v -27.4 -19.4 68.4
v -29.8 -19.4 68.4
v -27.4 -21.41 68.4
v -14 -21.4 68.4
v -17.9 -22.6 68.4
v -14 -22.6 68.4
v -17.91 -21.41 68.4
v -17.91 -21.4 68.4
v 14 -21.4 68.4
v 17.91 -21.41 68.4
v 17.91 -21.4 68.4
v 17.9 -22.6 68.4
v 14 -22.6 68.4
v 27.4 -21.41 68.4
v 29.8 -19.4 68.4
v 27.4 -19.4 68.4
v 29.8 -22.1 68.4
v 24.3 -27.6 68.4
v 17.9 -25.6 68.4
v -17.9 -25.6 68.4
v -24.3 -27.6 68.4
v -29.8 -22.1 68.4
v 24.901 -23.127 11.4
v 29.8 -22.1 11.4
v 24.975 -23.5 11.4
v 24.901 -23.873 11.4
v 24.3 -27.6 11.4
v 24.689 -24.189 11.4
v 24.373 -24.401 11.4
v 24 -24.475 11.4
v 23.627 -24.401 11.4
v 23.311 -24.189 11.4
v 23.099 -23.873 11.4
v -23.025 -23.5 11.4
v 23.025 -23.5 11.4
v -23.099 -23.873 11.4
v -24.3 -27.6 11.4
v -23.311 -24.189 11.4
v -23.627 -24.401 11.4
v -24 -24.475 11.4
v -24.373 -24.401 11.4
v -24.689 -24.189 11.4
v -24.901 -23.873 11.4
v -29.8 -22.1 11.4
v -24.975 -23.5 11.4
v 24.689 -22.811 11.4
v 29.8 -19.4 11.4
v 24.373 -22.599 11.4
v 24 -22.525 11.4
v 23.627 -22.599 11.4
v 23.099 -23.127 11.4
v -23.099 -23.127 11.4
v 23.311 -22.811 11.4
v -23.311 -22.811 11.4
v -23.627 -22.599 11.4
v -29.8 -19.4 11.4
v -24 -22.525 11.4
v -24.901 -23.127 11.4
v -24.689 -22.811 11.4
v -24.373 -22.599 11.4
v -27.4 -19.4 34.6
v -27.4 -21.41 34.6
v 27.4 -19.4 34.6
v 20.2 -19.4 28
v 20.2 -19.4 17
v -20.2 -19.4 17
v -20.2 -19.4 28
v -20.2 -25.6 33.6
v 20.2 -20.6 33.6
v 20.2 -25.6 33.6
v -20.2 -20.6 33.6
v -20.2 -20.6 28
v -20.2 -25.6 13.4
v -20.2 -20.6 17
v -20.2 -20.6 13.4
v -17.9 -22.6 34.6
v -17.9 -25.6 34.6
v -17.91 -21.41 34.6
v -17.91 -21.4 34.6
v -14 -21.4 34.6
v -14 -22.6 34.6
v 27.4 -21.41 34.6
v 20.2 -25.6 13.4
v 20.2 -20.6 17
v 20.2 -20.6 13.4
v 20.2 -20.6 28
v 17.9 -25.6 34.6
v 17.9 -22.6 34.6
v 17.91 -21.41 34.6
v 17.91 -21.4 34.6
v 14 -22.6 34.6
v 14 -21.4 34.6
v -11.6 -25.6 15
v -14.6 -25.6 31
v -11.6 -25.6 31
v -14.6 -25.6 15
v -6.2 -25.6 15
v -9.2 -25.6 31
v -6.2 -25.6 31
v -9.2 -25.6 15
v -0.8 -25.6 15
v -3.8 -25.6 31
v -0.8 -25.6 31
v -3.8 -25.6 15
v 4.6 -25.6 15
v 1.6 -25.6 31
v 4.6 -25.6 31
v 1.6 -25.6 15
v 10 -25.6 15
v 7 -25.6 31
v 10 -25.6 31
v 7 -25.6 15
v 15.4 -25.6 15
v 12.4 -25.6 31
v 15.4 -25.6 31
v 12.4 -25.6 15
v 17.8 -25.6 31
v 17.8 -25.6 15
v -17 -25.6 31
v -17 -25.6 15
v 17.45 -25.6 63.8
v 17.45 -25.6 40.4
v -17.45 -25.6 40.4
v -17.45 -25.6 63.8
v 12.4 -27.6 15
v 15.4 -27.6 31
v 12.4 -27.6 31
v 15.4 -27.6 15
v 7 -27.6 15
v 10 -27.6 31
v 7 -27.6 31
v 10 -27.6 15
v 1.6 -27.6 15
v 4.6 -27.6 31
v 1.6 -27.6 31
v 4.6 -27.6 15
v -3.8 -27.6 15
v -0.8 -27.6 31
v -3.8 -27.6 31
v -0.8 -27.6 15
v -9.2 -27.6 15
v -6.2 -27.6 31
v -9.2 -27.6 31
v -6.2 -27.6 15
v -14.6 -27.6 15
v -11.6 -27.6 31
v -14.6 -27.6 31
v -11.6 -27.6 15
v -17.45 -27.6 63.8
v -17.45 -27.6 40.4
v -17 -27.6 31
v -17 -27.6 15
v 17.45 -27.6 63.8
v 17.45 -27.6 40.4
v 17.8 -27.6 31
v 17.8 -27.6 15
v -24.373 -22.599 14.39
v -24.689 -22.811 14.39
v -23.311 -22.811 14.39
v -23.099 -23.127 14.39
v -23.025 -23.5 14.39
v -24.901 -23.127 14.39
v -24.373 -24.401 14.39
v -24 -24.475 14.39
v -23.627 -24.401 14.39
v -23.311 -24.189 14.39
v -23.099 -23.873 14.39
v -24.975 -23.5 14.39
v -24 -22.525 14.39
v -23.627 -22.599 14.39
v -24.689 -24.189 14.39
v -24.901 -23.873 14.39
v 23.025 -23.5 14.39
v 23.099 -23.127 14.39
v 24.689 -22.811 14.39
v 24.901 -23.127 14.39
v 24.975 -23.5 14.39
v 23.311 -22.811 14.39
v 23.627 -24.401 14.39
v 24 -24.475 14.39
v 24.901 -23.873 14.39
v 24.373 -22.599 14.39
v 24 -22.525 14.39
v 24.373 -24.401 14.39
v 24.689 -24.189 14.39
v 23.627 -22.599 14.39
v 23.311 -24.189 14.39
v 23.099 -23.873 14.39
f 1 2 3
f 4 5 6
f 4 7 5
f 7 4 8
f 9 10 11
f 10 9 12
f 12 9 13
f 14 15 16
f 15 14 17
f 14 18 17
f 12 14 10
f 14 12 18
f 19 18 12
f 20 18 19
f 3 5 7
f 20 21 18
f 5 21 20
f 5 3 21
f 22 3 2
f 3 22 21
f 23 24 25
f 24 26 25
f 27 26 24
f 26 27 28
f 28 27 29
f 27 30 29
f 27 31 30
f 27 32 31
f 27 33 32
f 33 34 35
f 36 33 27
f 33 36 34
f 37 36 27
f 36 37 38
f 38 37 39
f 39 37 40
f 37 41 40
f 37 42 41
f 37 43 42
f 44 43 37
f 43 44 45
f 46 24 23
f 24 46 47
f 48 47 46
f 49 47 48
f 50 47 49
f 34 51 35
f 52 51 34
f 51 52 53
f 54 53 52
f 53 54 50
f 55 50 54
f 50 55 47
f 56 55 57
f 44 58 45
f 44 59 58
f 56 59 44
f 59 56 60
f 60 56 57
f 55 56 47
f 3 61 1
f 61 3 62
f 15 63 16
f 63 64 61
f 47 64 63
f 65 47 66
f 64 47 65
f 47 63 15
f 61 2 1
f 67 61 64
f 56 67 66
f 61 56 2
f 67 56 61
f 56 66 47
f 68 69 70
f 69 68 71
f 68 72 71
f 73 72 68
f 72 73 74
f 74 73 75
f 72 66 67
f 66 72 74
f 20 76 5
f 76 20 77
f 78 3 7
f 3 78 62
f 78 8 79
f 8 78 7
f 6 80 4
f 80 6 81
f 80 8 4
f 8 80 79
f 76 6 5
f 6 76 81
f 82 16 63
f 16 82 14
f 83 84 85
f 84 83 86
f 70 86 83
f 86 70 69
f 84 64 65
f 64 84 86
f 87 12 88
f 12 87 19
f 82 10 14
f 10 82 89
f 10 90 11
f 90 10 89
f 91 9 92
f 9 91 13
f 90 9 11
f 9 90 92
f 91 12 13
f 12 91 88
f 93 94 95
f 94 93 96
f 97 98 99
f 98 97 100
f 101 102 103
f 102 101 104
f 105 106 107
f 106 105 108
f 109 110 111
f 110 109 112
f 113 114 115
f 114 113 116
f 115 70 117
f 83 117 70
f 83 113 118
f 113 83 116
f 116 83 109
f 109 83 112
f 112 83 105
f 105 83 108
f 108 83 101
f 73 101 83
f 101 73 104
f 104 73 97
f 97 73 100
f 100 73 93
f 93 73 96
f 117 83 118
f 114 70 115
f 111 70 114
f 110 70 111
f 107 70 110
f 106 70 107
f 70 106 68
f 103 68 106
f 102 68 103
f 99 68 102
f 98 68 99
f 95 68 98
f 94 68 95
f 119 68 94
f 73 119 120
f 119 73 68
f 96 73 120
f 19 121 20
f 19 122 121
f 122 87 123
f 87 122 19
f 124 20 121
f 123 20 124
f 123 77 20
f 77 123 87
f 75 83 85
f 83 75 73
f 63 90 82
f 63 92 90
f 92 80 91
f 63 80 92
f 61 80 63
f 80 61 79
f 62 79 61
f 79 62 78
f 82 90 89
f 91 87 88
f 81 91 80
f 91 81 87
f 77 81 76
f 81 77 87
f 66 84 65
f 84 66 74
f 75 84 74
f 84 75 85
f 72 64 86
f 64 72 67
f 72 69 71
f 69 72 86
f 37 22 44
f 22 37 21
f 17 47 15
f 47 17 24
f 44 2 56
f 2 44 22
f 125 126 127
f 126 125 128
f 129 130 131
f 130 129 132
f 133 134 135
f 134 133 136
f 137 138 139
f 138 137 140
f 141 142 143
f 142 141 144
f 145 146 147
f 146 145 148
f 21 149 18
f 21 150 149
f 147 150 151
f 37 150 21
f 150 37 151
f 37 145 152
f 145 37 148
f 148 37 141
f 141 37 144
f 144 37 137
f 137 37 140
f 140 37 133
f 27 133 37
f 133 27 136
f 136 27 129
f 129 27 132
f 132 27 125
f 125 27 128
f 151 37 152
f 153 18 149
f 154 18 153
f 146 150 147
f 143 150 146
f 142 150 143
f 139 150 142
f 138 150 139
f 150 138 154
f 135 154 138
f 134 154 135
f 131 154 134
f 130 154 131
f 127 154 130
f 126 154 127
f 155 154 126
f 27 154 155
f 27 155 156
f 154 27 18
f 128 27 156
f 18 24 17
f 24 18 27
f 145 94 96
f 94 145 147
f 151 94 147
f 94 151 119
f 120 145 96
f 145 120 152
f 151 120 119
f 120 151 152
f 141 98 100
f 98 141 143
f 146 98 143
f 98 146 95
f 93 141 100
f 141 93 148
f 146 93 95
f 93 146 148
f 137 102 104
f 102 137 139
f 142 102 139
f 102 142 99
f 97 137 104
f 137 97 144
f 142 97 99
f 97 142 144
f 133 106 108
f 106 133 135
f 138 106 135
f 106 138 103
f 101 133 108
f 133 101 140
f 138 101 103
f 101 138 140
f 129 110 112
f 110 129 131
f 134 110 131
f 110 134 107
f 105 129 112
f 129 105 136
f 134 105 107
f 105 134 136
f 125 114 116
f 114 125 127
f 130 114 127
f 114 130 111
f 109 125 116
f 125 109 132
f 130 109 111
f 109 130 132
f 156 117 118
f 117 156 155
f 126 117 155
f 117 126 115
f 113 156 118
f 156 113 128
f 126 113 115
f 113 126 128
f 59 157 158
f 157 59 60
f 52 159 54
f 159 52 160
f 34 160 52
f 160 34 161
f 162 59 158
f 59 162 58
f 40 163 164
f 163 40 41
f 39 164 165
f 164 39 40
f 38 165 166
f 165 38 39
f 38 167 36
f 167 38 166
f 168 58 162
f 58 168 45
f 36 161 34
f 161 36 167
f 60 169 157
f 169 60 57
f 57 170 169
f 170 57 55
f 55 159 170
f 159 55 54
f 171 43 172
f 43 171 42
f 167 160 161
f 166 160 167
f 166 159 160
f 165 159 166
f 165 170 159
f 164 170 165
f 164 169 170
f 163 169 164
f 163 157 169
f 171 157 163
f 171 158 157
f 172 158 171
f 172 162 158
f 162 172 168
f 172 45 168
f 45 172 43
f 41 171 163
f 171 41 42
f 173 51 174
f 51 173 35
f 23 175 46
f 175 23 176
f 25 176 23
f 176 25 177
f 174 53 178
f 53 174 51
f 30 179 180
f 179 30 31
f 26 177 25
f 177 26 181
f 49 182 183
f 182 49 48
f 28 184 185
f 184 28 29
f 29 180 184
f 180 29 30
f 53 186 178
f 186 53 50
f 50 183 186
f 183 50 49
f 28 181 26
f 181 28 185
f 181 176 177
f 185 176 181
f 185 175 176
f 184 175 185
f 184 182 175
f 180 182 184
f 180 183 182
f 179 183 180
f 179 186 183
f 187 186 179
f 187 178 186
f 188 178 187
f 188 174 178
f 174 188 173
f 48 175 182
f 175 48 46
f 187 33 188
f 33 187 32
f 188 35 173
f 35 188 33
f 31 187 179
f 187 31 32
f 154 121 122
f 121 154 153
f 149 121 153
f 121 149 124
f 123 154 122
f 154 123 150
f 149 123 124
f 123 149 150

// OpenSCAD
// file: ../config.scad
// Sparky - shared parameters and the module interface spec.
// All dimensions in mm. Origin: centre line of the body, on the table.
// +X = right, +Y = back, -Y = front (screen side), +Z = up.
//
// Values marked (measure) are estimates; measure your parts and edit here.

$fn = 48;

// ---------- Interface (keep fixed so modules stay swappable) ----------
outer_w   = 64.4;    // shell, collar and base footprint
outer_y0  = -30;     // front face of the shell
outer_y1  = 26.6;    // back face of the shell
outer_d   = outer_y1 - outer_y0;          // 56.6
outer_cy  = (outer_y0 + outer_y1) / 2;    // footprint centre (Y)
corner_r  = 8;       // outer corner radius of shell, collar and base
wall      = 2;       // shell wall
in_r      = corner_r - wall;              // 6, inside radius of the shell
clear     = 0.3;     // fit clearance between printed parts

feet_h    = 2;       // base feet
base_top  = 7;       // top of the base = underside of the rack
collar_h  = 4;
shell_z0  = base_top + collar_h;          // 11, bottom of the shell
shell_z1  = 76;      // top of the shell

// Magnets: 6 x 3 mm neodymium discs, all N faces pointing up.
mag_d     = 6.2;     // pocket diameter (magnet 6.0)
mag_h     = 3.2;     // pocket depth (magnet 3.0)
boss_d    = 9;

mag_base_rack  = [[-24,-15],[24,-15],[-24,16],[24,16]];   // base top <-> rack floor
mag_rack_shell = [[-23,-15],[23,-15],[-23,17],[23,17]];   // rack towers <-> shell ceiling
pin_hole  = 1.95;    // locating pins: short pieces of 1.75 mm filament
pin_depth = 3;
collar_pins = [[-15, 24.25], [15, 24.25]];   // base <-> collar
face_pins   = [[-24, -23.5], [24, -23.5]];   // rack floor <-> face frame

// ---------- Rack (the body every part slides into) ----------
rack_xo   = 29.8;    // outside of the side walls
rack_t    = 2.4;     // side wall thickness
rack_xi   = rack_xo - rack_t;            // 27.4
rack_yf   = -27.6;   // front of the face frame
rack_yb   = 21.6;    // back of the rack (open)
rack_cf   = 5.5;     // 45 deg front corner chamfer (clears the shell's inside radius, prints face-down)
rack_rb   = 3.5;     // back corner radius
floor_z   = base_top;                    // 7
floor_t   = 4.4;
in_z      = floor_z + floor_t;           // 11.4, top of the floor
rack_top  = 68.4;    // top of the walls = underside of the lid
lid_t     = 4;
lid_top   = rack_top + lid_t;            // 72.4

tower_x   = 17.2;    // inner face of the two top towers (lid fits between)
tower_z0  = rack_top - 2;                // underside of the towers
chamfer   = 3;       // 45 deg chamfer on the towers' outer top edges

// LiPo side bays: a rib on each side, the bay is between rib and wall
rib_x     = 19.6;    // inner face of the rib
rib_t     = 1.6;
bay_z1    = 41.8;    // top of the ribs

// Middle plate (slide 2): MPU-6050 on top, amp hanging underneath
plate_z0  = 43;
plate_t   = 3;
plate_z1  = plate_z0 + plate_t;          // 46
plate_y0  = -15.2;
plate_w   = 2*rack_xi - 0.4;
hole_x    = [12, 19.4];                  // wire holes in the plate corners (|x|)
hole_yf   = [-14.2, -8.6];
hole_yb   = [13.6, 19.6];
ledge     = 1.2;                         // plate ledges on the walls

// Board slide (slide 1)
board     = [28, 34.6, 1.6];             // expansion board (measure)
board_y0  = -12.6;
board_z   = in_z + 1;                    // board rests on two ledges

// Face frame (display + speaker), drops onto the floor in front of the walls
face_yb   = -19.4;   // back of the face frame = front of the side walls
face_t    = 2;       // front plate
flange_t  = 2;       // bottom flange the speaker stands on

// ---------- Components (measure) ----------
oled      = [35.4, 1.4, 33.4];           // 1.3" OLED PCB, landscape, pins on top
glass     = [34.5, 1.4, 23];
glass_up  = 6;       // glass bottom above the PCB bottom
speaker   = [40, 4.8, 20];               // 2040 speaker standing on edge
spk_z0    = in_z + flange_t;             // 13.4
ledge_z0  = spk_z0 + speaker[2] + 0.2;   // 33.6, display shelf
oled_z0   = ledge_z0 + 1;                // 34.6
mpu       = [20.3, 15.6, 1.6];           // GY-521
amp       = [17.8, 19.3, 1.6];           // MAX98357A
mic_d     = 14;                          // INMP441, round
mic_xy    = [-2, -2.5];
touch     = [15, 11];                    // TTP223
battery   = [5, 40, 30];                 // LiPo 503040 on edge

// Shell openings
win_w     = 31;      // display window (active area 29.4 x 14.7)
win_z     = [oled_z0 + glass_up + 3, oled_z0 + glass_up + 20];
grille_z  = [15.4, 31.4];
usb       = [12.4, 21.3, 28.1];          // width, z0, z1
mic_hole  = 1.4;

// ---------- Helpers ----------
module rrect2d(w, d, r) { offset(r) square([w - 2*r, d - 2*r], center = true); }
module rrect(w, d, r, h) { linear_extrude(h) rrect2d(w, d, r); }
module rbox(w, d, h, r) {      // box with every edge rounded, z from 0 to h
  hull() for (x = [-1,1], y = [-1,1], z = [r, h - r])
    translate([x*(w/2 - r), y*(d/2 - r), z]) sphere(r);
}
module mag_pocket(z) { translate([0,0,z]) cylinder(d = mag_d, h = mag_h); }
module pin_hole_at(z, h = pin_depth) translate([0,0,z]) cylinder(d = pin_hole, h = h, $fn = 16);

// Plan outline of the rack (and the collar opening)
module rack_2d(grow = 0) {
  offset(delta = grow) hull() {
    polygon([[-rack_xo + rack_cf, rack_yf], [rack_xo - rack_cf, rack_yf], [rack_xo, rack_yf + rack_cf], [-rack_xo, rack_yf + rack_cf]]);
    for (s = [-1, 1]) translate([s*(rack_xo - rack_rb), rack_yb - rack_rb]) circle(rack_rb);
  }
}
// Outer footprint (shell, collar, base)
module outer_2d() translate([0, outer_cy]) rrect2d(outer_w, outer_d, corner_r);

// A profile in the X-Z plane, extruded along Y from y0 to y1.
module along_y(y0, y1) translate([0, y1, 0]) rotate([90, 0, 0]) linear_extrude(y1 - y0) children();
// A profile in the Y-Z plane, extruded along X from x0 to x1.
module along_x(x0, x1) translate([x0, 0, 0]) rotate([90, 0, 90]) linear_extrude(x1 - x0) children();
// main file
// Face frame: the front of Sparky. The display slides down into its groove
// from the top, the speaker stands behind the grille below it. The frame
// stands on the rack floor on two filament pins; the shell holds it in.
// Prints face-down: every shelf and stop is then a wall growing off the bed.
include <../config.scad>

module face() {
  yi  = rack_yf + face_t;             // inside of the front plate
  sx  = speaker[0]/2 + 0.2;           // speaker pocket half-width
  gy  = yi + glass[1] + oled[1] + 0.2;// display groove: glass + PCB + clearance
  sy0 = yi + speaker[1] + 0.2;        // speaker back stop
  difference() {
    intersection() {
      union() {
        translate([-rack_xo, rack_yf, in_z]) cube([2*rack_xo, face_t, rack_top - in_z]);               // front plate
        translate([-rack_xo, rack_yf, in_z]) cube([2*rack_xo, face_yb - rack_yf, flange_t]);           // bottom flange
        translate([-rack_xi, yi - 0.01, ledge_z0]) cube([2*rack_xi, face_yb - yi + 0.01, oled_z0 - ledge_z0]); // display shelf
        for (s = [-1, 1]) mirror([s < 0 ? 1 : 0, 0, 0]) {
          translate([rack_xi, rack_yf, in_z]) cube([rack_t, face_yb - rack_yf, rack_top - in_z]);       // cheek
          translate([sx, yi - 0.01, in_z]) cube([rack_xi - sx + 0.01, face_yb - yi + 0.01, ledge_z0 - in_z]); // speaker side block
          translate([oled[0]/2 + 0.2, yi - 0.01, oled_z0 - 0.01]) cube([rack_xi - oled[0]/2 - 0.2 + 0.01, gy + 1.2 - yi, rack_top - oled_z0 + 0.01]); // display side stop
          translate([oled[0]/2 - 3.7, gy, oled_z0 - 0.01]) cube([3.91, 1.2, rack_top - oled_z0 + 0.01]);   // display rear strip
        }
        // speaker back stops (bottom and top bar)
        translate([-sx - 0.01, sy0, in_z]) cube([2*sx + 0.02, face_yb - sy0, flange_t + 3.6]);
        translate([-sx - 0.01, sy0, ledge_z0 - 5.6]) cube([2*sx + 0.02, face_yb - sy0, 5.6]);
      }
      translate([0, 0, in_z - 1]) linear_extrude(rack_top - in_z + 2) rack_2d();
    }
    // display window (the glass sits against the plate)
    translate([-glass[0]/2 - 0.2, rack_yf - 1, oled_z0 + glass_up - 0.2]) cube([glass[0] + 0.4, face_t + 2, glass[2] + 0.4]);
    // speaker grille
    for (i = [0 : 6]) translate([-17 + i*5.4, rack_yf - 1, grille_z[0] - 0.4]) cube([2.4, face_t + 2, grille_z[1] - grille_z[0]]);
    // locating pin holes
    for (p = face_pins) translate([p[0], p[1], 0]) pin_hole_at(in_z - 0.01);
  }
}

face();
